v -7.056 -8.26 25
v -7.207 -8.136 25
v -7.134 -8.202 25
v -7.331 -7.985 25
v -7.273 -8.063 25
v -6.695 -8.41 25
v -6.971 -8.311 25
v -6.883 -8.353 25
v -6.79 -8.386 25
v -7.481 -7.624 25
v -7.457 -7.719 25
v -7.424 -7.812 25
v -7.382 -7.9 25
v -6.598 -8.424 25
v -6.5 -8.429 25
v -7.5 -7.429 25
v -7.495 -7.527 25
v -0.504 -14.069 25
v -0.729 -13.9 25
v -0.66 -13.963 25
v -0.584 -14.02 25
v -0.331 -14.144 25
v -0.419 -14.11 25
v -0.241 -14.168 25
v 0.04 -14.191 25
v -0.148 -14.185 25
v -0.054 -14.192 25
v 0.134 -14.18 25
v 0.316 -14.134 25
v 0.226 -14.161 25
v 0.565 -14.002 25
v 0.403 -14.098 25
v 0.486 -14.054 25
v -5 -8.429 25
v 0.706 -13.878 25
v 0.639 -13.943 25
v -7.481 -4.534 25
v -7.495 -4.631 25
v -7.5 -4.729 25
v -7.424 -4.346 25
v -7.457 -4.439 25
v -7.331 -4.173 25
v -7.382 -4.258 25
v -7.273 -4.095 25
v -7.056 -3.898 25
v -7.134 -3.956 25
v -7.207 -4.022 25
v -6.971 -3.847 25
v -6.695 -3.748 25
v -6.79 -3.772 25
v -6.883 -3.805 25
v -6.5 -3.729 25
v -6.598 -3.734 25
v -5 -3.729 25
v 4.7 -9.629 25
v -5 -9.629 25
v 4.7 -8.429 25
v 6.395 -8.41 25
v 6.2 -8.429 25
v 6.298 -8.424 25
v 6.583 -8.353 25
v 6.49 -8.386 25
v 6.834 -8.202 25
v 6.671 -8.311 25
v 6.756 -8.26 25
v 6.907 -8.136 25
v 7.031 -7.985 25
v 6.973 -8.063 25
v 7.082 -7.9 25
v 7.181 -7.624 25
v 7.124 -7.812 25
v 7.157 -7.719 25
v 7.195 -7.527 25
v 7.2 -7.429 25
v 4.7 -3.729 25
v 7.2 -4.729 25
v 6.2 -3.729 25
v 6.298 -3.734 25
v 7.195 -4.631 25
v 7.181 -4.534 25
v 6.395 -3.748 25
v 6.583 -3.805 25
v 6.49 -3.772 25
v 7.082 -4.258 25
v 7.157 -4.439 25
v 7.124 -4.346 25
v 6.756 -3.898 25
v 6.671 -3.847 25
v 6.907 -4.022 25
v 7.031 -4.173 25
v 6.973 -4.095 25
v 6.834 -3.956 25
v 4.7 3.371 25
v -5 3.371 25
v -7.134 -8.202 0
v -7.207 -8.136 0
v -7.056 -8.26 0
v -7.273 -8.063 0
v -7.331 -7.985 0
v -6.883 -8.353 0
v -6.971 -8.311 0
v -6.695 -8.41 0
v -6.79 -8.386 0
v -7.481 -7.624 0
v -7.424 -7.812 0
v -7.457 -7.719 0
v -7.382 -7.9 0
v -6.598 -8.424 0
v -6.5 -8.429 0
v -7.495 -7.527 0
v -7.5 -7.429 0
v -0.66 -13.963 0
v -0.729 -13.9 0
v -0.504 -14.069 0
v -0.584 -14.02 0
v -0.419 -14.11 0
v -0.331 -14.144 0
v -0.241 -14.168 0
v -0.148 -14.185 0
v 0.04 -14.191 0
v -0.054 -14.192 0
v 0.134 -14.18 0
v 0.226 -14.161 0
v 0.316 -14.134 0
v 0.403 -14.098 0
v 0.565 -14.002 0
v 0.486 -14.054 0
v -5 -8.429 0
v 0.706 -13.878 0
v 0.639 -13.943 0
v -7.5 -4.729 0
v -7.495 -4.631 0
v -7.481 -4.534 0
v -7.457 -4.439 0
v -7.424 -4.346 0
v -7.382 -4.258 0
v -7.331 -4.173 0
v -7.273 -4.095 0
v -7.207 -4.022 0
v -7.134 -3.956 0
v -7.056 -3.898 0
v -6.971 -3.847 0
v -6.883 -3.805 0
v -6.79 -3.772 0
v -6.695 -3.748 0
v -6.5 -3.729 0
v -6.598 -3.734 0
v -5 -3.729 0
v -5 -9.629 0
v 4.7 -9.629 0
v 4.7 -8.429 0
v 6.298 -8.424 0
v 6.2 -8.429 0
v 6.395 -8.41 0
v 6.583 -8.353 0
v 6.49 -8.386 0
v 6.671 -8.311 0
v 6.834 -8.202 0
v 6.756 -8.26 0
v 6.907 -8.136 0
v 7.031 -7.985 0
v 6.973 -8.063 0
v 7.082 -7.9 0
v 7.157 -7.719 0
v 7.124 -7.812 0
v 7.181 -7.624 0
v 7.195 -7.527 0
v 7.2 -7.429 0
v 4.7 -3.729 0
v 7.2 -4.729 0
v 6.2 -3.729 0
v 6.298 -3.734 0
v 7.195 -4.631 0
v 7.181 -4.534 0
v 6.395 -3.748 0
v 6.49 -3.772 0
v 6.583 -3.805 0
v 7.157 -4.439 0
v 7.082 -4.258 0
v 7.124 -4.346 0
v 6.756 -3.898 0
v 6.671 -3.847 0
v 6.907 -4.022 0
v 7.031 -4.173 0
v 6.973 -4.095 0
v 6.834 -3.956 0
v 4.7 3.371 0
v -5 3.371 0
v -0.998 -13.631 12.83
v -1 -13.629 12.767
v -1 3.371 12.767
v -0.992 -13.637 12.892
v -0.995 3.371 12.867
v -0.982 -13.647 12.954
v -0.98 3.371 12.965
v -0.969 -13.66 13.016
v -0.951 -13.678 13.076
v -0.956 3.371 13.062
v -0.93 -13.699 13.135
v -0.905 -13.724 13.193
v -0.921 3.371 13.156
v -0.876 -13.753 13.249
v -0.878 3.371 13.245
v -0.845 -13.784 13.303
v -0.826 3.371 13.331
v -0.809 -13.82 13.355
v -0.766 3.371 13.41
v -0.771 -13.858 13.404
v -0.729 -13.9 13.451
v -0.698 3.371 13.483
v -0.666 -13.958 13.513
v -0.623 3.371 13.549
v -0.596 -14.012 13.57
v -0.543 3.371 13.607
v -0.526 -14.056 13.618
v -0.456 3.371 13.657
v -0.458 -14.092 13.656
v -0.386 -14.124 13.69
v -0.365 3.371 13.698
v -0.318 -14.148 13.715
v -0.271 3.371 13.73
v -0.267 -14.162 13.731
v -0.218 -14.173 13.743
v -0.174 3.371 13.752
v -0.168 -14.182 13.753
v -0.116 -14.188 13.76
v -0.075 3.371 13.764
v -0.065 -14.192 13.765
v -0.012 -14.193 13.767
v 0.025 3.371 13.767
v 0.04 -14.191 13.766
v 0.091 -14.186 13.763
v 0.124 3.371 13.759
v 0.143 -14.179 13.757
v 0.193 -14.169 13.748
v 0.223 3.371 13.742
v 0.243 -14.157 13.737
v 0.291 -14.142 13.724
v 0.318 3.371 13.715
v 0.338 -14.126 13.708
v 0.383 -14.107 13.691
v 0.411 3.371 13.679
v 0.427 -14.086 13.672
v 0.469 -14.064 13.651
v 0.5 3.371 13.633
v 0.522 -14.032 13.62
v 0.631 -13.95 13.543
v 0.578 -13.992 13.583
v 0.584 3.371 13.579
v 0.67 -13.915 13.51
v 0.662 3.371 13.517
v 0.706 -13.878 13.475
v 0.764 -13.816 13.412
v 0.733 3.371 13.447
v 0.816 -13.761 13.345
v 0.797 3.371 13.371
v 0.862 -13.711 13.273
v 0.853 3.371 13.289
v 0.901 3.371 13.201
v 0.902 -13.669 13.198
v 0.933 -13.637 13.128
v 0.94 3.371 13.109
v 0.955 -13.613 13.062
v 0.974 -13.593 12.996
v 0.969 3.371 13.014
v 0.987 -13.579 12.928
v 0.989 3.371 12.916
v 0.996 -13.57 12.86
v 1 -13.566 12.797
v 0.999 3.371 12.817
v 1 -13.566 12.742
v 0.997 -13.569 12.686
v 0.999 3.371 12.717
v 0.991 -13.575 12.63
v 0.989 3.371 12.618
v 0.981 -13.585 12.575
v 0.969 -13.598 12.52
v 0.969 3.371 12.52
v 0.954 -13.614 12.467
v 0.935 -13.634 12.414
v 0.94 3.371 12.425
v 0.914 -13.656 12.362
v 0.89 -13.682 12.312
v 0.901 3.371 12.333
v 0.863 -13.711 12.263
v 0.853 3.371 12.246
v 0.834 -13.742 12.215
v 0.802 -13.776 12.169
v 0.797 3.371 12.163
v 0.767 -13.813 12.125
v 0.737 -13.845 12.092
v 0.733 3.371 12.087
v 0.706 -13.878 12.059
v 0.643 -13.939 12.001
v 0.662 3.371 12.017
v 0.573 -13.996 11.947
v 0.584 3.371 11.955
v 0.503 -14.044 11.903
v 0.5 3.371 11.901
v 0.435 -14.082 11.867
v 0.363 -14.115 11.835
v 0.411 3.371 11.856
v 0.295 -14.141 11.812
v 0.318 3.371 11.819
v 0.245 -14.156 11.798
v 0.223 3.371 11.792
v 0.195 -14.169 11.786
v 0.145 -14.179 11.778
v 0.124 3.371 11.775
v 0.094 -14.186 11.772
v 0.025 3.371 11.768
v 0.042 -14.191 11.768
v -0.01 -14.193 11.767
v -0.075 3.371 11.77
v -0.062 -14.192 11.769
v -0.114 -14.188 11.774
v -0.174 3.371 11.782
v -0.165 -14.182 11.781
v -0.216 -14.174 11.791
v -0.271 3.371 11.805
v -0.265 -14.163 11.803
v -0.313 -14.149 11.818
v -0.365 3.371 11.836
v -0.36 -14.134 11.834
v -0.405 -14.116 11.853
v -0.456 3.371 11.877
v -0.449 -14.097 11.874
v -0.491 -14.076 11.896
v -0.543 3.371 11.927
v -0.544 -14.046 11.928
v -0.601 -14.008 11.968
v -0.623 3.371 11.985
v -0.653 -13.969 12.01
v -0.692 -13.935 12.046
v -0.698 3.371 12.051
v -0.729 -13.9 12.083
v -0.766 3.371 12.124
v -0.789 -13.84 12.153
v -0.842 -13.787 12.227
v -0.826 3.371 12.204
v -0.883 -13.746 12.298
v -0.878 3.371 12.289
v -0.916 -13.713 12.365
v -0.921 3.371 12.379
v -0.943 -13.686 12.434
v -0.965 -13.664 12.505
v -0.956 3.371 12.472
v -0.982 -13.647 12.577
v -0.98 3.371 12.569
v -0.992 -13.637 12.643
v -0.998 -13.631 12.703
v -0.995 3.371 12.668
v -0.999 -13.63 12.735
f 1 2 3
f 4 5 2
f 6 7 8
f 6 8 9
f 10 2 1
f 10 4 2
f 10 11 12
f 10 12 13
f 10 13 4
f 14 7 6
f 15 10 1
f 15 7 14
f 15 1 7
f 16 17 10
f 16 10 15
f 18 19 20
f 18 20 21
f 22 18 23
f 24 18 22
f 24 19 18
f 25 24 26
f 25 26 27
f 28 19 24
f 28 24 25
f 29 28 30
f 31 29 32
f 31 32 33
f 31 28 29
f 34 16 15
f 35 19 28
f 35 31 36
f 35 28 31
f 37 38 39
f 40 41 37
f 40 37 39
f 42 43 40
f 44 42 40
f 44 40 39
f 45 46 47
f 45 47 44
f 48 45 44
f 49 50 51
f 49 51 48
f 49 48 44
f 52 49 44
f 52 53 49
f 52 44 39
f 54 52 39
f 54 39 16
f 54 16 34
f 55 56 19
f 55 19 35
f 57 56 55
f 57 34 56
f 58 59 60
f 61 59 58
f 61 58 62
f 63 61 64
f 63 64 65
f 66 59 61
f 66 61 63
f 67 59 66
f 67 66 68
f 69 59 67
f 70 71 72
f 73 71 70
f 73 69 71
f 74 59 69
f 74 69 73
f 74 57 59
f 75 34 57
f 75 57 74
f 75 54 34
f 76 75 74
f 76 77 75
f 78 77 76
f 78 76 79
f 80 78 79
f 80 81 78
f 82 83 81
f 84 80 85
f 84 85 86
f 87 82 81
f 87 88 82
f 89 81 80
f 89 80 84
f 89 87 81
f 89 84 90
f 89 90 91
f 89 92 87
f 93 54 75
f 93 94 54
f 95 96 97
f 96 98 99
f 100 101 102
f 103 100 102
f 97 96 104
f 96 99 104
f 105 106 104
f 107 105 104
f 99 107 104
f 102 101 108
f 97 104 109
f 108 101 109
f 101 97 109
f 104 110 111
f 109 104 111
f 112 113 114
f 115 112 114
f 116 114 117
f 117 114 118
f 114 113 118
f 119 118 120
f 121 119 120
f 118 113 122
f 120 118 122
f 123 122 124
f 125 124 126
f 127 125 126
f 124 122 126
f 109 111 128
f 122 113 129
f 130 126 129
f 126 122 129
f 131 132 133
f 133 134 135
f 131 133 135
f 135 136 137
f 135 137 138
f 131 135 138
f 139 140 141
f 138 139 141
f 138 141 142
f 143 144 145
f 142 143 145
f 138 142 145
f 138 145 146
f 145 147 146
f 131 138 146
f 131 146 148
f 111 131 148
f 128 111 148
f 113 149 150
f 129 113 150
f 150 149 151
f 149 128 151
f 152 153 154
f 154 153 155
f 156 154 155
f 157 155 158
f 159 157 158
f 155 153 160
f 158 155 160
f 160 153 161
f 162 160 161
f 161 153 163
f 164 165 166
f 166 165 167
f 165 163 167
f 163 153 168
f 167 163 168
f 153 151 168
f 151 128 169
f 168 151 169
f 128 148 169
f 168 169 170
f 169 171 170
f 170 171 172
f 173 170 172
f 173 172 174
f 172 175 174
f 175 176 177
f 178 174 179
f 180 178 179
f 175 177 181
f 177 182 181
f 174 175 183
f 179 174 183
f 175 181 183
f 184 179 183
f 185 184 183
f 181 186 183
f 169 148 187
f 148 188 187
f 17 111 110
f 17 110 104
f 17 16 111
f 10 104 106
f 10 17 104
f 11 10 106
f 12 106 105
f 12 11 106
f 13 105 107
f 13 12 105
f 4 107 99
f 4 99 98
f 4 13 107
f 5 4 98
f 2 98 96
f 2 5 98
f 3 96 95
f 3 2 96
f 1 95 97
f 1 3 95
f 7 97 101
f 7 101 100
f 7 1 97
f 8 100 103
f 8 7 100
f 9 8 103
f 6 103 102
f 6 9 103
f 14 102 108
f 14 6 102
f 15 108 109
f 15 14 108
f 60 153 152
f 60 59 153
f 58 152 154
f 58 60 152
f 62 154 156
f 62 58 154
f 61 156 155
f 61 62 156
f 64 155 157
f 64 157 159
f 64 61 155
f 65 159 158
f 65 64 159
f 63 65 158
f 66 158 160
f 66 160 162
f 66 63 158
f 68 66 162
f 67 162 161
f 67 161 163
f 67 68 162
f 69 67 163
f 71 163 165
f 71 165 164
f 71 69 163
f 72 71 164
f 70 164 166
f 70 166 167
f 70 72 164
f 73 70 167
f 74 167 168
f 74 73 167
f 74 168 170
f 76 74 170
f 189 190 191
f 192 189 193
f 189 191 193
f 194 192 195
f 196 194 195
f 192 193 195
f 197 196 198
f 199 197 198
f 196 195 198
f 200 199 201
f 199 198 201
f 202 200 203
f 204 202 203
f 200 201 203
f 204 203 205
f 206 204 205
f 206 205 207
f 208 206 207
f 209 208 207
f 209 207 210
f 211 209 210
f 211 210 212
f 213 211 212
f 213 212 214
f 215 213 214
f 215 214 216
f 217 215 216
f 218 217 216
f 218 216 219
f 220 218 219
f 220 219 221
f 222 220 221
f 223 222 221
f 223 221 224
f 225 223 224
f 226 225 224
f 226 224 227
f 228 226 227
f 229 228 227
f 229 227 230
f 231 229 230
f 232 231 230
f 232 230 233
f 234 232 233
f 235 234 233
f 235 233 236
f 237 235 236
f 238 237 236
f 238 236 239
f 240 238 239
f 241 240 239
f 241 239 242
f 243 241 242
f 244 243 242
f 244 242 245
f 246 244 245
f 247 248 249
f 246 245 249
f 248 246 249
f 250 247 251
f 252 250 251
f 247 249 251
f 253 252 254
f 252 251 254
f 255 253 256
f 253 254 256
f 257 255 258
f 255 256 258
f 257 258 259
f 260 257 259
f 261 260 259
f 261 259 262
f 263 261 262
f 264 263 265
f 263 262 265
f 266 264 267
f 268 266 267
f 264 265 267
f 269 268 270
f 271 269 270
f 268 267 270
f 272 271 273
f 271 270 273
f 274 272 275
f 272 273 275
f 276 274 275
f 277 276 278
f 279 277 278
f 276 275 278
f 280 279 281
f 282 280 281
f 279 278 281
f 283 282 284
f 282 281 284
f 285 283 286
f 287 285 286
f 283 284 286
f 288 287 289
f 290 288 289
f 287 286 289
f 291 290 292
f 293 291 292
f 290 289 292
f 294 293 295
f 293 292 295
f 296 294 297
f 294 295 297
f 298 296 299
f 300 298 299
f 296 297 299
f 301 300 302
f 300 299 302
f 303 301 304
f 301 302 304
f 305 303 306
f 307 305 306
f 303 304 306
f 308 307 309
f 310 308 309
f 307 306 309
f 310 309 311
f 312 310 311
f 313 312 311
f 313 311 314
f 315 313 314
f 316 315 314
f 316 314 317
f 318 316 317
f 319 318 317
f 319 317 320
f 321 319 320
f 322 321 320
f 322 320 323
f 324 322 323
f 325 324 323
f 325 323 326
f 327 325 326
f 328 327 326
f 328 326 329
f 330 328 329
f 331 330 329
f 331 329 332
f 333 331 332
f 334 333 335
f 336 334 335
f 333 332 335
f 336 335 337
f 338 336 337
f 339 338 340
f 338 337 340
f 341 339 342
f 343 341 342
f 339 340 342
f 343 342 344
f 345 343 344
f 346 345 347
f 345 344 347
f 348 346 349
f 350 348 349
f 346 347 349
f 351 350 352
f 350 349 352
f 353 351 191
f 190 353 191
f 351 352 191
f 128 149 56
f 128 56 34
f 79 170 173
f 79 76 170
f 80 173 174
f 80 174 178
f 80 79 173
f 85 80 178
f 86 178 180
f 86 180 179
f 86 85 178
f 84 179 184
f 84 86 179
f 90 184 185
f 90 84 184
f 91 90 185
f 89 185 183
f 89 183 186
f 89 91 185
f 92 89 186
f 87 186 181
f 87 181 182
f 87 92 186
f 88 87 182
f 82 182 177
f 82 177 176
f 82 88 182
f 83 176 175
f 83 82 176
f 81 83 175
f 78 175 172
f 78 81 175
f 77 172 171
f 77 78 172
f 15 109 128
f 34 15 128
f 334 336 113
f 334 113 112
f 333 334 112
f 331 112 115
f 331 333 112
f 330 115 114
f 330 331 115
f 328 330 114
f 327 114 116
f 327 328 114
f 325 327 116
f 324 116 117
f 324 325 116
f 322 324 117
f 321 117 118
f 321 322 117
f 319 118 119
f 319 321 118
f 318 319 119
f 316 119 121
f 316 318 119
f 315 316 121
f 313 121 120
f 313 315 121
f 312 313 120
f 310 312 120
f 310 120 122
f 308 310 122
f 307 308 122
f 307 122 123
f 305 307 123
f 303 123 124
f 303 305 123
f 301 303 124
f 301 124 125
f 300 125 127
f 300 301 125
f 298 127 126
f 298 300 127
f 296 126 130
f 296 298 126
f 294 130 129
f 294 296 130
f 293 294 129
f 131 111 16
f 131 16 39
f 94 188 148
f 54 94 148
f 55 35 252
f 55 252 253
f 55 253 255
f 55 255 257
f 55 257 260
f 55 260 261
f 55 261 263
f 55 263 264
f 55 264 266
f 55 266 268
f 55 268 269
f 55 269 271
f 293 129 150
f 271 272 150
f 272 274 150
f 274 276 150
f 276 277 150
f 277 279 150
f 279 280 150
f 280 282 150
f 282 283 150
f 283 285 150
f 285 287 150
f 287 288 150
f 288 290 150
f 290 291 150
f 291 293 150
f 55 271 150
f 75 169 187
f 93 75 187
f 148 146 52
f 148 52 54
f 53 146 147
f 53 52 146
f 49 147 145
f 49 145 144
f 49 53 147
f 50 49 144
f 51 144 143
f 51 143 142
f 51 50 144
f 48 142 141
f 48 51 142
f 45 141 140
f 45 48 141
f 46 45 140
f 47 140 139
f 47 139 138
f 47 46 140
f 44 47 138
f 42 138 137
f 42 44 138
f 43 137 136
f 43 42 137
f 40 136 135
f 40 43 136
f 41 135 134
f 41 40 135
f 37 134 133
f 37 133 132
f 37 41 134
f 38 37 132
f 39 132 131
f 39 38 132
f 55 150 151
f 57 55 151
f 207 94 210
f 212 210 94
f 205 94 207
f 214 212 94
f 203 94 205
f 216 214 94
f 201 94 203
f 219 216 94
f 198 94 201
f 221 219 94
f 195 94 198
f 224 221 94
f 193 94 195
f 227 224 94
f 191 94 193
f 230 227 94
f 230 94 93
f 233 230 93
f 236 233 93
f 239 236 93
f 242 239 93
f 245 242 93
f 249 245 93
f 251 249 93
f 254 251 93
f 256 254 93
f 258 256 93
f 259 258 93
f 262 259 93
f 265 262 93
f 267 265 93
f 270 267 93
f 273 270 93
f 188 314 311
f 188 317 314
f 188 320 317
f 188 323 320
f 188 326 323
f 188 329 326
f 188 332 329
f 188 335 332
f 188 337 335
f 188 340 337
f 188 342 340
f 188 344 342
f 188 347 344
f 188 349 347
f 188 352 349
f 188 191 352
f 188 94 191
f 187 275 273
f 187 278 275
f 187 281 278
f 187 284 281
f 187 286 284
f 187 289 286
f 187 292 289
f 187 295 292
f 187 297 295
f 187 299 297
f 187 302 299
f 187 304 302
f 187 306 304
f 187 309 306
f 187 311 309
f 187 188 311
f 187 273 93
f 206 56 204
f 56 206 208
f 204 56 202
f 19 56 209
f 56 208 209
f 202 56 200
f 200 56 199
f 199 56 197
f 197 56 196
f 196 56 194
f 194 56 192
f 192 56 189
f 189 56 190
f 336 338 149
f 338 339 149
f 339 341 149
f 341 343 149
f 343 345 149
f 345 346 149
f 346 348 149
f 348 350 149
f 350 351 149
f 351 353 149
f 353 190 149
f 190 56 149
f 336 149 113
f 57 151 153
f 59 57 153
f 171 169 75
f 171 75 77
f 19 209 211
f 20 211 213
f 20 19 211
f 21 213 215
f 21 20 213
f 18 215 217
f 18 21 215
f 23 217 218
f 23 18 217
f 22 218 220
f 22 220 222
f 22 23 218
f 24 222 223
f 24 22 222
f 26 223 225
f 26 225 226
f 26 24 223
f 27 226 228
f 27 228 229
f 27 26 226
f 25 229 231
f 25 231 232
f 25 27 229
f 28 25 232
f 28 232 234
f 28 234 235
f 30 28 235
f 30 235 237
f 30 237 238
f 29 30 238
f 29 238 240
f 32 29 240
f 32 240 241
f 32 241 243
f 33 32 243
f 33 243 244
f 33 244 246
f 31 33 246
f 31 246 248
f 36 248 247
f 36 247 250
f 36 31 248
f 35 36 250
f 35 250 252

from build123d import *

# Parameters (mm, degrees)
F0_W     = 9.7
F0_H     = 7.1
F0_H_2   = 4.7
F0_W_2   = 2.5
F0_H_3   = 1.2
F1_DEPTH = 25
F2_R     = 1
F3_R     = 1
F4_DEPTH = 17.5645790518
F5_R     = 1
F6_DEPTH = 22.29565


with BuildPart() as f1:
    # F0 (on Top) → F1 (new body)
    with BuildSketch(Plane.XY):
        with Locations((-0.15, -0.179021287)):
            Rectangle(F0_W, F0_H)
        with Locations((-0.15, -6.079021287)):
            Rectangle(F0_W, F0_H_2)
        with Locations((-6.25, -6.079021287)):
            Rectangle(F0_W_2, F0_H_2)
        with Locations((5.95, -6.079021287)):
            Rectangle(F0_W_2, F0_H_2)
        with Locations((-0.15, -9.029021287)):
            Rectangle(F0_W, F0_H_3)
        Polygon((4.7, -9.629021287), (-5, -9.629021287), (0, -14.629021287), align=None)
    extrude(amount=F1_DEPTH)

    # F2
    f2_edges = [f1.edges().sort_by_distance(p)[0] for p in [
        (-7.5, -3.729021, 12.5),
        (-7.5, -8.429021, 12.5),
        (7.2, -3.729021, 12.5),
        (7.2, -8.429021, 12.5),
        (0, -14.629021, 12.5),
    ]]
    fillet(f2_edges, radius=F2_R)

    # F3 (on face) → F4 (cut, through all)
    with BuildSketch(Plane(origin=(0, 3.370978713, 0), x_dir=(-1, 0, 0), z_dir=(0, 1, 0))):
        with Locations((0, 12.7671947703)):
            Circle(F3_R)
    extrude(amount=-F4_DEPTH, mode=Mode.SUBTRACT)

    # F5 (on face) → F6 (cut)
    with BuildSketch(Plane(origin=(0, 3.370978713, 0), x_dir=(-1, 0, 0), z_dir=(0, 1, 0))):
        with Locations((0, 18.7855240438)):
            Circle(F5_R)
    extrude(amount=F6_DEPTH, mode=Mode.SUBTRACT)


solid = f1.part
